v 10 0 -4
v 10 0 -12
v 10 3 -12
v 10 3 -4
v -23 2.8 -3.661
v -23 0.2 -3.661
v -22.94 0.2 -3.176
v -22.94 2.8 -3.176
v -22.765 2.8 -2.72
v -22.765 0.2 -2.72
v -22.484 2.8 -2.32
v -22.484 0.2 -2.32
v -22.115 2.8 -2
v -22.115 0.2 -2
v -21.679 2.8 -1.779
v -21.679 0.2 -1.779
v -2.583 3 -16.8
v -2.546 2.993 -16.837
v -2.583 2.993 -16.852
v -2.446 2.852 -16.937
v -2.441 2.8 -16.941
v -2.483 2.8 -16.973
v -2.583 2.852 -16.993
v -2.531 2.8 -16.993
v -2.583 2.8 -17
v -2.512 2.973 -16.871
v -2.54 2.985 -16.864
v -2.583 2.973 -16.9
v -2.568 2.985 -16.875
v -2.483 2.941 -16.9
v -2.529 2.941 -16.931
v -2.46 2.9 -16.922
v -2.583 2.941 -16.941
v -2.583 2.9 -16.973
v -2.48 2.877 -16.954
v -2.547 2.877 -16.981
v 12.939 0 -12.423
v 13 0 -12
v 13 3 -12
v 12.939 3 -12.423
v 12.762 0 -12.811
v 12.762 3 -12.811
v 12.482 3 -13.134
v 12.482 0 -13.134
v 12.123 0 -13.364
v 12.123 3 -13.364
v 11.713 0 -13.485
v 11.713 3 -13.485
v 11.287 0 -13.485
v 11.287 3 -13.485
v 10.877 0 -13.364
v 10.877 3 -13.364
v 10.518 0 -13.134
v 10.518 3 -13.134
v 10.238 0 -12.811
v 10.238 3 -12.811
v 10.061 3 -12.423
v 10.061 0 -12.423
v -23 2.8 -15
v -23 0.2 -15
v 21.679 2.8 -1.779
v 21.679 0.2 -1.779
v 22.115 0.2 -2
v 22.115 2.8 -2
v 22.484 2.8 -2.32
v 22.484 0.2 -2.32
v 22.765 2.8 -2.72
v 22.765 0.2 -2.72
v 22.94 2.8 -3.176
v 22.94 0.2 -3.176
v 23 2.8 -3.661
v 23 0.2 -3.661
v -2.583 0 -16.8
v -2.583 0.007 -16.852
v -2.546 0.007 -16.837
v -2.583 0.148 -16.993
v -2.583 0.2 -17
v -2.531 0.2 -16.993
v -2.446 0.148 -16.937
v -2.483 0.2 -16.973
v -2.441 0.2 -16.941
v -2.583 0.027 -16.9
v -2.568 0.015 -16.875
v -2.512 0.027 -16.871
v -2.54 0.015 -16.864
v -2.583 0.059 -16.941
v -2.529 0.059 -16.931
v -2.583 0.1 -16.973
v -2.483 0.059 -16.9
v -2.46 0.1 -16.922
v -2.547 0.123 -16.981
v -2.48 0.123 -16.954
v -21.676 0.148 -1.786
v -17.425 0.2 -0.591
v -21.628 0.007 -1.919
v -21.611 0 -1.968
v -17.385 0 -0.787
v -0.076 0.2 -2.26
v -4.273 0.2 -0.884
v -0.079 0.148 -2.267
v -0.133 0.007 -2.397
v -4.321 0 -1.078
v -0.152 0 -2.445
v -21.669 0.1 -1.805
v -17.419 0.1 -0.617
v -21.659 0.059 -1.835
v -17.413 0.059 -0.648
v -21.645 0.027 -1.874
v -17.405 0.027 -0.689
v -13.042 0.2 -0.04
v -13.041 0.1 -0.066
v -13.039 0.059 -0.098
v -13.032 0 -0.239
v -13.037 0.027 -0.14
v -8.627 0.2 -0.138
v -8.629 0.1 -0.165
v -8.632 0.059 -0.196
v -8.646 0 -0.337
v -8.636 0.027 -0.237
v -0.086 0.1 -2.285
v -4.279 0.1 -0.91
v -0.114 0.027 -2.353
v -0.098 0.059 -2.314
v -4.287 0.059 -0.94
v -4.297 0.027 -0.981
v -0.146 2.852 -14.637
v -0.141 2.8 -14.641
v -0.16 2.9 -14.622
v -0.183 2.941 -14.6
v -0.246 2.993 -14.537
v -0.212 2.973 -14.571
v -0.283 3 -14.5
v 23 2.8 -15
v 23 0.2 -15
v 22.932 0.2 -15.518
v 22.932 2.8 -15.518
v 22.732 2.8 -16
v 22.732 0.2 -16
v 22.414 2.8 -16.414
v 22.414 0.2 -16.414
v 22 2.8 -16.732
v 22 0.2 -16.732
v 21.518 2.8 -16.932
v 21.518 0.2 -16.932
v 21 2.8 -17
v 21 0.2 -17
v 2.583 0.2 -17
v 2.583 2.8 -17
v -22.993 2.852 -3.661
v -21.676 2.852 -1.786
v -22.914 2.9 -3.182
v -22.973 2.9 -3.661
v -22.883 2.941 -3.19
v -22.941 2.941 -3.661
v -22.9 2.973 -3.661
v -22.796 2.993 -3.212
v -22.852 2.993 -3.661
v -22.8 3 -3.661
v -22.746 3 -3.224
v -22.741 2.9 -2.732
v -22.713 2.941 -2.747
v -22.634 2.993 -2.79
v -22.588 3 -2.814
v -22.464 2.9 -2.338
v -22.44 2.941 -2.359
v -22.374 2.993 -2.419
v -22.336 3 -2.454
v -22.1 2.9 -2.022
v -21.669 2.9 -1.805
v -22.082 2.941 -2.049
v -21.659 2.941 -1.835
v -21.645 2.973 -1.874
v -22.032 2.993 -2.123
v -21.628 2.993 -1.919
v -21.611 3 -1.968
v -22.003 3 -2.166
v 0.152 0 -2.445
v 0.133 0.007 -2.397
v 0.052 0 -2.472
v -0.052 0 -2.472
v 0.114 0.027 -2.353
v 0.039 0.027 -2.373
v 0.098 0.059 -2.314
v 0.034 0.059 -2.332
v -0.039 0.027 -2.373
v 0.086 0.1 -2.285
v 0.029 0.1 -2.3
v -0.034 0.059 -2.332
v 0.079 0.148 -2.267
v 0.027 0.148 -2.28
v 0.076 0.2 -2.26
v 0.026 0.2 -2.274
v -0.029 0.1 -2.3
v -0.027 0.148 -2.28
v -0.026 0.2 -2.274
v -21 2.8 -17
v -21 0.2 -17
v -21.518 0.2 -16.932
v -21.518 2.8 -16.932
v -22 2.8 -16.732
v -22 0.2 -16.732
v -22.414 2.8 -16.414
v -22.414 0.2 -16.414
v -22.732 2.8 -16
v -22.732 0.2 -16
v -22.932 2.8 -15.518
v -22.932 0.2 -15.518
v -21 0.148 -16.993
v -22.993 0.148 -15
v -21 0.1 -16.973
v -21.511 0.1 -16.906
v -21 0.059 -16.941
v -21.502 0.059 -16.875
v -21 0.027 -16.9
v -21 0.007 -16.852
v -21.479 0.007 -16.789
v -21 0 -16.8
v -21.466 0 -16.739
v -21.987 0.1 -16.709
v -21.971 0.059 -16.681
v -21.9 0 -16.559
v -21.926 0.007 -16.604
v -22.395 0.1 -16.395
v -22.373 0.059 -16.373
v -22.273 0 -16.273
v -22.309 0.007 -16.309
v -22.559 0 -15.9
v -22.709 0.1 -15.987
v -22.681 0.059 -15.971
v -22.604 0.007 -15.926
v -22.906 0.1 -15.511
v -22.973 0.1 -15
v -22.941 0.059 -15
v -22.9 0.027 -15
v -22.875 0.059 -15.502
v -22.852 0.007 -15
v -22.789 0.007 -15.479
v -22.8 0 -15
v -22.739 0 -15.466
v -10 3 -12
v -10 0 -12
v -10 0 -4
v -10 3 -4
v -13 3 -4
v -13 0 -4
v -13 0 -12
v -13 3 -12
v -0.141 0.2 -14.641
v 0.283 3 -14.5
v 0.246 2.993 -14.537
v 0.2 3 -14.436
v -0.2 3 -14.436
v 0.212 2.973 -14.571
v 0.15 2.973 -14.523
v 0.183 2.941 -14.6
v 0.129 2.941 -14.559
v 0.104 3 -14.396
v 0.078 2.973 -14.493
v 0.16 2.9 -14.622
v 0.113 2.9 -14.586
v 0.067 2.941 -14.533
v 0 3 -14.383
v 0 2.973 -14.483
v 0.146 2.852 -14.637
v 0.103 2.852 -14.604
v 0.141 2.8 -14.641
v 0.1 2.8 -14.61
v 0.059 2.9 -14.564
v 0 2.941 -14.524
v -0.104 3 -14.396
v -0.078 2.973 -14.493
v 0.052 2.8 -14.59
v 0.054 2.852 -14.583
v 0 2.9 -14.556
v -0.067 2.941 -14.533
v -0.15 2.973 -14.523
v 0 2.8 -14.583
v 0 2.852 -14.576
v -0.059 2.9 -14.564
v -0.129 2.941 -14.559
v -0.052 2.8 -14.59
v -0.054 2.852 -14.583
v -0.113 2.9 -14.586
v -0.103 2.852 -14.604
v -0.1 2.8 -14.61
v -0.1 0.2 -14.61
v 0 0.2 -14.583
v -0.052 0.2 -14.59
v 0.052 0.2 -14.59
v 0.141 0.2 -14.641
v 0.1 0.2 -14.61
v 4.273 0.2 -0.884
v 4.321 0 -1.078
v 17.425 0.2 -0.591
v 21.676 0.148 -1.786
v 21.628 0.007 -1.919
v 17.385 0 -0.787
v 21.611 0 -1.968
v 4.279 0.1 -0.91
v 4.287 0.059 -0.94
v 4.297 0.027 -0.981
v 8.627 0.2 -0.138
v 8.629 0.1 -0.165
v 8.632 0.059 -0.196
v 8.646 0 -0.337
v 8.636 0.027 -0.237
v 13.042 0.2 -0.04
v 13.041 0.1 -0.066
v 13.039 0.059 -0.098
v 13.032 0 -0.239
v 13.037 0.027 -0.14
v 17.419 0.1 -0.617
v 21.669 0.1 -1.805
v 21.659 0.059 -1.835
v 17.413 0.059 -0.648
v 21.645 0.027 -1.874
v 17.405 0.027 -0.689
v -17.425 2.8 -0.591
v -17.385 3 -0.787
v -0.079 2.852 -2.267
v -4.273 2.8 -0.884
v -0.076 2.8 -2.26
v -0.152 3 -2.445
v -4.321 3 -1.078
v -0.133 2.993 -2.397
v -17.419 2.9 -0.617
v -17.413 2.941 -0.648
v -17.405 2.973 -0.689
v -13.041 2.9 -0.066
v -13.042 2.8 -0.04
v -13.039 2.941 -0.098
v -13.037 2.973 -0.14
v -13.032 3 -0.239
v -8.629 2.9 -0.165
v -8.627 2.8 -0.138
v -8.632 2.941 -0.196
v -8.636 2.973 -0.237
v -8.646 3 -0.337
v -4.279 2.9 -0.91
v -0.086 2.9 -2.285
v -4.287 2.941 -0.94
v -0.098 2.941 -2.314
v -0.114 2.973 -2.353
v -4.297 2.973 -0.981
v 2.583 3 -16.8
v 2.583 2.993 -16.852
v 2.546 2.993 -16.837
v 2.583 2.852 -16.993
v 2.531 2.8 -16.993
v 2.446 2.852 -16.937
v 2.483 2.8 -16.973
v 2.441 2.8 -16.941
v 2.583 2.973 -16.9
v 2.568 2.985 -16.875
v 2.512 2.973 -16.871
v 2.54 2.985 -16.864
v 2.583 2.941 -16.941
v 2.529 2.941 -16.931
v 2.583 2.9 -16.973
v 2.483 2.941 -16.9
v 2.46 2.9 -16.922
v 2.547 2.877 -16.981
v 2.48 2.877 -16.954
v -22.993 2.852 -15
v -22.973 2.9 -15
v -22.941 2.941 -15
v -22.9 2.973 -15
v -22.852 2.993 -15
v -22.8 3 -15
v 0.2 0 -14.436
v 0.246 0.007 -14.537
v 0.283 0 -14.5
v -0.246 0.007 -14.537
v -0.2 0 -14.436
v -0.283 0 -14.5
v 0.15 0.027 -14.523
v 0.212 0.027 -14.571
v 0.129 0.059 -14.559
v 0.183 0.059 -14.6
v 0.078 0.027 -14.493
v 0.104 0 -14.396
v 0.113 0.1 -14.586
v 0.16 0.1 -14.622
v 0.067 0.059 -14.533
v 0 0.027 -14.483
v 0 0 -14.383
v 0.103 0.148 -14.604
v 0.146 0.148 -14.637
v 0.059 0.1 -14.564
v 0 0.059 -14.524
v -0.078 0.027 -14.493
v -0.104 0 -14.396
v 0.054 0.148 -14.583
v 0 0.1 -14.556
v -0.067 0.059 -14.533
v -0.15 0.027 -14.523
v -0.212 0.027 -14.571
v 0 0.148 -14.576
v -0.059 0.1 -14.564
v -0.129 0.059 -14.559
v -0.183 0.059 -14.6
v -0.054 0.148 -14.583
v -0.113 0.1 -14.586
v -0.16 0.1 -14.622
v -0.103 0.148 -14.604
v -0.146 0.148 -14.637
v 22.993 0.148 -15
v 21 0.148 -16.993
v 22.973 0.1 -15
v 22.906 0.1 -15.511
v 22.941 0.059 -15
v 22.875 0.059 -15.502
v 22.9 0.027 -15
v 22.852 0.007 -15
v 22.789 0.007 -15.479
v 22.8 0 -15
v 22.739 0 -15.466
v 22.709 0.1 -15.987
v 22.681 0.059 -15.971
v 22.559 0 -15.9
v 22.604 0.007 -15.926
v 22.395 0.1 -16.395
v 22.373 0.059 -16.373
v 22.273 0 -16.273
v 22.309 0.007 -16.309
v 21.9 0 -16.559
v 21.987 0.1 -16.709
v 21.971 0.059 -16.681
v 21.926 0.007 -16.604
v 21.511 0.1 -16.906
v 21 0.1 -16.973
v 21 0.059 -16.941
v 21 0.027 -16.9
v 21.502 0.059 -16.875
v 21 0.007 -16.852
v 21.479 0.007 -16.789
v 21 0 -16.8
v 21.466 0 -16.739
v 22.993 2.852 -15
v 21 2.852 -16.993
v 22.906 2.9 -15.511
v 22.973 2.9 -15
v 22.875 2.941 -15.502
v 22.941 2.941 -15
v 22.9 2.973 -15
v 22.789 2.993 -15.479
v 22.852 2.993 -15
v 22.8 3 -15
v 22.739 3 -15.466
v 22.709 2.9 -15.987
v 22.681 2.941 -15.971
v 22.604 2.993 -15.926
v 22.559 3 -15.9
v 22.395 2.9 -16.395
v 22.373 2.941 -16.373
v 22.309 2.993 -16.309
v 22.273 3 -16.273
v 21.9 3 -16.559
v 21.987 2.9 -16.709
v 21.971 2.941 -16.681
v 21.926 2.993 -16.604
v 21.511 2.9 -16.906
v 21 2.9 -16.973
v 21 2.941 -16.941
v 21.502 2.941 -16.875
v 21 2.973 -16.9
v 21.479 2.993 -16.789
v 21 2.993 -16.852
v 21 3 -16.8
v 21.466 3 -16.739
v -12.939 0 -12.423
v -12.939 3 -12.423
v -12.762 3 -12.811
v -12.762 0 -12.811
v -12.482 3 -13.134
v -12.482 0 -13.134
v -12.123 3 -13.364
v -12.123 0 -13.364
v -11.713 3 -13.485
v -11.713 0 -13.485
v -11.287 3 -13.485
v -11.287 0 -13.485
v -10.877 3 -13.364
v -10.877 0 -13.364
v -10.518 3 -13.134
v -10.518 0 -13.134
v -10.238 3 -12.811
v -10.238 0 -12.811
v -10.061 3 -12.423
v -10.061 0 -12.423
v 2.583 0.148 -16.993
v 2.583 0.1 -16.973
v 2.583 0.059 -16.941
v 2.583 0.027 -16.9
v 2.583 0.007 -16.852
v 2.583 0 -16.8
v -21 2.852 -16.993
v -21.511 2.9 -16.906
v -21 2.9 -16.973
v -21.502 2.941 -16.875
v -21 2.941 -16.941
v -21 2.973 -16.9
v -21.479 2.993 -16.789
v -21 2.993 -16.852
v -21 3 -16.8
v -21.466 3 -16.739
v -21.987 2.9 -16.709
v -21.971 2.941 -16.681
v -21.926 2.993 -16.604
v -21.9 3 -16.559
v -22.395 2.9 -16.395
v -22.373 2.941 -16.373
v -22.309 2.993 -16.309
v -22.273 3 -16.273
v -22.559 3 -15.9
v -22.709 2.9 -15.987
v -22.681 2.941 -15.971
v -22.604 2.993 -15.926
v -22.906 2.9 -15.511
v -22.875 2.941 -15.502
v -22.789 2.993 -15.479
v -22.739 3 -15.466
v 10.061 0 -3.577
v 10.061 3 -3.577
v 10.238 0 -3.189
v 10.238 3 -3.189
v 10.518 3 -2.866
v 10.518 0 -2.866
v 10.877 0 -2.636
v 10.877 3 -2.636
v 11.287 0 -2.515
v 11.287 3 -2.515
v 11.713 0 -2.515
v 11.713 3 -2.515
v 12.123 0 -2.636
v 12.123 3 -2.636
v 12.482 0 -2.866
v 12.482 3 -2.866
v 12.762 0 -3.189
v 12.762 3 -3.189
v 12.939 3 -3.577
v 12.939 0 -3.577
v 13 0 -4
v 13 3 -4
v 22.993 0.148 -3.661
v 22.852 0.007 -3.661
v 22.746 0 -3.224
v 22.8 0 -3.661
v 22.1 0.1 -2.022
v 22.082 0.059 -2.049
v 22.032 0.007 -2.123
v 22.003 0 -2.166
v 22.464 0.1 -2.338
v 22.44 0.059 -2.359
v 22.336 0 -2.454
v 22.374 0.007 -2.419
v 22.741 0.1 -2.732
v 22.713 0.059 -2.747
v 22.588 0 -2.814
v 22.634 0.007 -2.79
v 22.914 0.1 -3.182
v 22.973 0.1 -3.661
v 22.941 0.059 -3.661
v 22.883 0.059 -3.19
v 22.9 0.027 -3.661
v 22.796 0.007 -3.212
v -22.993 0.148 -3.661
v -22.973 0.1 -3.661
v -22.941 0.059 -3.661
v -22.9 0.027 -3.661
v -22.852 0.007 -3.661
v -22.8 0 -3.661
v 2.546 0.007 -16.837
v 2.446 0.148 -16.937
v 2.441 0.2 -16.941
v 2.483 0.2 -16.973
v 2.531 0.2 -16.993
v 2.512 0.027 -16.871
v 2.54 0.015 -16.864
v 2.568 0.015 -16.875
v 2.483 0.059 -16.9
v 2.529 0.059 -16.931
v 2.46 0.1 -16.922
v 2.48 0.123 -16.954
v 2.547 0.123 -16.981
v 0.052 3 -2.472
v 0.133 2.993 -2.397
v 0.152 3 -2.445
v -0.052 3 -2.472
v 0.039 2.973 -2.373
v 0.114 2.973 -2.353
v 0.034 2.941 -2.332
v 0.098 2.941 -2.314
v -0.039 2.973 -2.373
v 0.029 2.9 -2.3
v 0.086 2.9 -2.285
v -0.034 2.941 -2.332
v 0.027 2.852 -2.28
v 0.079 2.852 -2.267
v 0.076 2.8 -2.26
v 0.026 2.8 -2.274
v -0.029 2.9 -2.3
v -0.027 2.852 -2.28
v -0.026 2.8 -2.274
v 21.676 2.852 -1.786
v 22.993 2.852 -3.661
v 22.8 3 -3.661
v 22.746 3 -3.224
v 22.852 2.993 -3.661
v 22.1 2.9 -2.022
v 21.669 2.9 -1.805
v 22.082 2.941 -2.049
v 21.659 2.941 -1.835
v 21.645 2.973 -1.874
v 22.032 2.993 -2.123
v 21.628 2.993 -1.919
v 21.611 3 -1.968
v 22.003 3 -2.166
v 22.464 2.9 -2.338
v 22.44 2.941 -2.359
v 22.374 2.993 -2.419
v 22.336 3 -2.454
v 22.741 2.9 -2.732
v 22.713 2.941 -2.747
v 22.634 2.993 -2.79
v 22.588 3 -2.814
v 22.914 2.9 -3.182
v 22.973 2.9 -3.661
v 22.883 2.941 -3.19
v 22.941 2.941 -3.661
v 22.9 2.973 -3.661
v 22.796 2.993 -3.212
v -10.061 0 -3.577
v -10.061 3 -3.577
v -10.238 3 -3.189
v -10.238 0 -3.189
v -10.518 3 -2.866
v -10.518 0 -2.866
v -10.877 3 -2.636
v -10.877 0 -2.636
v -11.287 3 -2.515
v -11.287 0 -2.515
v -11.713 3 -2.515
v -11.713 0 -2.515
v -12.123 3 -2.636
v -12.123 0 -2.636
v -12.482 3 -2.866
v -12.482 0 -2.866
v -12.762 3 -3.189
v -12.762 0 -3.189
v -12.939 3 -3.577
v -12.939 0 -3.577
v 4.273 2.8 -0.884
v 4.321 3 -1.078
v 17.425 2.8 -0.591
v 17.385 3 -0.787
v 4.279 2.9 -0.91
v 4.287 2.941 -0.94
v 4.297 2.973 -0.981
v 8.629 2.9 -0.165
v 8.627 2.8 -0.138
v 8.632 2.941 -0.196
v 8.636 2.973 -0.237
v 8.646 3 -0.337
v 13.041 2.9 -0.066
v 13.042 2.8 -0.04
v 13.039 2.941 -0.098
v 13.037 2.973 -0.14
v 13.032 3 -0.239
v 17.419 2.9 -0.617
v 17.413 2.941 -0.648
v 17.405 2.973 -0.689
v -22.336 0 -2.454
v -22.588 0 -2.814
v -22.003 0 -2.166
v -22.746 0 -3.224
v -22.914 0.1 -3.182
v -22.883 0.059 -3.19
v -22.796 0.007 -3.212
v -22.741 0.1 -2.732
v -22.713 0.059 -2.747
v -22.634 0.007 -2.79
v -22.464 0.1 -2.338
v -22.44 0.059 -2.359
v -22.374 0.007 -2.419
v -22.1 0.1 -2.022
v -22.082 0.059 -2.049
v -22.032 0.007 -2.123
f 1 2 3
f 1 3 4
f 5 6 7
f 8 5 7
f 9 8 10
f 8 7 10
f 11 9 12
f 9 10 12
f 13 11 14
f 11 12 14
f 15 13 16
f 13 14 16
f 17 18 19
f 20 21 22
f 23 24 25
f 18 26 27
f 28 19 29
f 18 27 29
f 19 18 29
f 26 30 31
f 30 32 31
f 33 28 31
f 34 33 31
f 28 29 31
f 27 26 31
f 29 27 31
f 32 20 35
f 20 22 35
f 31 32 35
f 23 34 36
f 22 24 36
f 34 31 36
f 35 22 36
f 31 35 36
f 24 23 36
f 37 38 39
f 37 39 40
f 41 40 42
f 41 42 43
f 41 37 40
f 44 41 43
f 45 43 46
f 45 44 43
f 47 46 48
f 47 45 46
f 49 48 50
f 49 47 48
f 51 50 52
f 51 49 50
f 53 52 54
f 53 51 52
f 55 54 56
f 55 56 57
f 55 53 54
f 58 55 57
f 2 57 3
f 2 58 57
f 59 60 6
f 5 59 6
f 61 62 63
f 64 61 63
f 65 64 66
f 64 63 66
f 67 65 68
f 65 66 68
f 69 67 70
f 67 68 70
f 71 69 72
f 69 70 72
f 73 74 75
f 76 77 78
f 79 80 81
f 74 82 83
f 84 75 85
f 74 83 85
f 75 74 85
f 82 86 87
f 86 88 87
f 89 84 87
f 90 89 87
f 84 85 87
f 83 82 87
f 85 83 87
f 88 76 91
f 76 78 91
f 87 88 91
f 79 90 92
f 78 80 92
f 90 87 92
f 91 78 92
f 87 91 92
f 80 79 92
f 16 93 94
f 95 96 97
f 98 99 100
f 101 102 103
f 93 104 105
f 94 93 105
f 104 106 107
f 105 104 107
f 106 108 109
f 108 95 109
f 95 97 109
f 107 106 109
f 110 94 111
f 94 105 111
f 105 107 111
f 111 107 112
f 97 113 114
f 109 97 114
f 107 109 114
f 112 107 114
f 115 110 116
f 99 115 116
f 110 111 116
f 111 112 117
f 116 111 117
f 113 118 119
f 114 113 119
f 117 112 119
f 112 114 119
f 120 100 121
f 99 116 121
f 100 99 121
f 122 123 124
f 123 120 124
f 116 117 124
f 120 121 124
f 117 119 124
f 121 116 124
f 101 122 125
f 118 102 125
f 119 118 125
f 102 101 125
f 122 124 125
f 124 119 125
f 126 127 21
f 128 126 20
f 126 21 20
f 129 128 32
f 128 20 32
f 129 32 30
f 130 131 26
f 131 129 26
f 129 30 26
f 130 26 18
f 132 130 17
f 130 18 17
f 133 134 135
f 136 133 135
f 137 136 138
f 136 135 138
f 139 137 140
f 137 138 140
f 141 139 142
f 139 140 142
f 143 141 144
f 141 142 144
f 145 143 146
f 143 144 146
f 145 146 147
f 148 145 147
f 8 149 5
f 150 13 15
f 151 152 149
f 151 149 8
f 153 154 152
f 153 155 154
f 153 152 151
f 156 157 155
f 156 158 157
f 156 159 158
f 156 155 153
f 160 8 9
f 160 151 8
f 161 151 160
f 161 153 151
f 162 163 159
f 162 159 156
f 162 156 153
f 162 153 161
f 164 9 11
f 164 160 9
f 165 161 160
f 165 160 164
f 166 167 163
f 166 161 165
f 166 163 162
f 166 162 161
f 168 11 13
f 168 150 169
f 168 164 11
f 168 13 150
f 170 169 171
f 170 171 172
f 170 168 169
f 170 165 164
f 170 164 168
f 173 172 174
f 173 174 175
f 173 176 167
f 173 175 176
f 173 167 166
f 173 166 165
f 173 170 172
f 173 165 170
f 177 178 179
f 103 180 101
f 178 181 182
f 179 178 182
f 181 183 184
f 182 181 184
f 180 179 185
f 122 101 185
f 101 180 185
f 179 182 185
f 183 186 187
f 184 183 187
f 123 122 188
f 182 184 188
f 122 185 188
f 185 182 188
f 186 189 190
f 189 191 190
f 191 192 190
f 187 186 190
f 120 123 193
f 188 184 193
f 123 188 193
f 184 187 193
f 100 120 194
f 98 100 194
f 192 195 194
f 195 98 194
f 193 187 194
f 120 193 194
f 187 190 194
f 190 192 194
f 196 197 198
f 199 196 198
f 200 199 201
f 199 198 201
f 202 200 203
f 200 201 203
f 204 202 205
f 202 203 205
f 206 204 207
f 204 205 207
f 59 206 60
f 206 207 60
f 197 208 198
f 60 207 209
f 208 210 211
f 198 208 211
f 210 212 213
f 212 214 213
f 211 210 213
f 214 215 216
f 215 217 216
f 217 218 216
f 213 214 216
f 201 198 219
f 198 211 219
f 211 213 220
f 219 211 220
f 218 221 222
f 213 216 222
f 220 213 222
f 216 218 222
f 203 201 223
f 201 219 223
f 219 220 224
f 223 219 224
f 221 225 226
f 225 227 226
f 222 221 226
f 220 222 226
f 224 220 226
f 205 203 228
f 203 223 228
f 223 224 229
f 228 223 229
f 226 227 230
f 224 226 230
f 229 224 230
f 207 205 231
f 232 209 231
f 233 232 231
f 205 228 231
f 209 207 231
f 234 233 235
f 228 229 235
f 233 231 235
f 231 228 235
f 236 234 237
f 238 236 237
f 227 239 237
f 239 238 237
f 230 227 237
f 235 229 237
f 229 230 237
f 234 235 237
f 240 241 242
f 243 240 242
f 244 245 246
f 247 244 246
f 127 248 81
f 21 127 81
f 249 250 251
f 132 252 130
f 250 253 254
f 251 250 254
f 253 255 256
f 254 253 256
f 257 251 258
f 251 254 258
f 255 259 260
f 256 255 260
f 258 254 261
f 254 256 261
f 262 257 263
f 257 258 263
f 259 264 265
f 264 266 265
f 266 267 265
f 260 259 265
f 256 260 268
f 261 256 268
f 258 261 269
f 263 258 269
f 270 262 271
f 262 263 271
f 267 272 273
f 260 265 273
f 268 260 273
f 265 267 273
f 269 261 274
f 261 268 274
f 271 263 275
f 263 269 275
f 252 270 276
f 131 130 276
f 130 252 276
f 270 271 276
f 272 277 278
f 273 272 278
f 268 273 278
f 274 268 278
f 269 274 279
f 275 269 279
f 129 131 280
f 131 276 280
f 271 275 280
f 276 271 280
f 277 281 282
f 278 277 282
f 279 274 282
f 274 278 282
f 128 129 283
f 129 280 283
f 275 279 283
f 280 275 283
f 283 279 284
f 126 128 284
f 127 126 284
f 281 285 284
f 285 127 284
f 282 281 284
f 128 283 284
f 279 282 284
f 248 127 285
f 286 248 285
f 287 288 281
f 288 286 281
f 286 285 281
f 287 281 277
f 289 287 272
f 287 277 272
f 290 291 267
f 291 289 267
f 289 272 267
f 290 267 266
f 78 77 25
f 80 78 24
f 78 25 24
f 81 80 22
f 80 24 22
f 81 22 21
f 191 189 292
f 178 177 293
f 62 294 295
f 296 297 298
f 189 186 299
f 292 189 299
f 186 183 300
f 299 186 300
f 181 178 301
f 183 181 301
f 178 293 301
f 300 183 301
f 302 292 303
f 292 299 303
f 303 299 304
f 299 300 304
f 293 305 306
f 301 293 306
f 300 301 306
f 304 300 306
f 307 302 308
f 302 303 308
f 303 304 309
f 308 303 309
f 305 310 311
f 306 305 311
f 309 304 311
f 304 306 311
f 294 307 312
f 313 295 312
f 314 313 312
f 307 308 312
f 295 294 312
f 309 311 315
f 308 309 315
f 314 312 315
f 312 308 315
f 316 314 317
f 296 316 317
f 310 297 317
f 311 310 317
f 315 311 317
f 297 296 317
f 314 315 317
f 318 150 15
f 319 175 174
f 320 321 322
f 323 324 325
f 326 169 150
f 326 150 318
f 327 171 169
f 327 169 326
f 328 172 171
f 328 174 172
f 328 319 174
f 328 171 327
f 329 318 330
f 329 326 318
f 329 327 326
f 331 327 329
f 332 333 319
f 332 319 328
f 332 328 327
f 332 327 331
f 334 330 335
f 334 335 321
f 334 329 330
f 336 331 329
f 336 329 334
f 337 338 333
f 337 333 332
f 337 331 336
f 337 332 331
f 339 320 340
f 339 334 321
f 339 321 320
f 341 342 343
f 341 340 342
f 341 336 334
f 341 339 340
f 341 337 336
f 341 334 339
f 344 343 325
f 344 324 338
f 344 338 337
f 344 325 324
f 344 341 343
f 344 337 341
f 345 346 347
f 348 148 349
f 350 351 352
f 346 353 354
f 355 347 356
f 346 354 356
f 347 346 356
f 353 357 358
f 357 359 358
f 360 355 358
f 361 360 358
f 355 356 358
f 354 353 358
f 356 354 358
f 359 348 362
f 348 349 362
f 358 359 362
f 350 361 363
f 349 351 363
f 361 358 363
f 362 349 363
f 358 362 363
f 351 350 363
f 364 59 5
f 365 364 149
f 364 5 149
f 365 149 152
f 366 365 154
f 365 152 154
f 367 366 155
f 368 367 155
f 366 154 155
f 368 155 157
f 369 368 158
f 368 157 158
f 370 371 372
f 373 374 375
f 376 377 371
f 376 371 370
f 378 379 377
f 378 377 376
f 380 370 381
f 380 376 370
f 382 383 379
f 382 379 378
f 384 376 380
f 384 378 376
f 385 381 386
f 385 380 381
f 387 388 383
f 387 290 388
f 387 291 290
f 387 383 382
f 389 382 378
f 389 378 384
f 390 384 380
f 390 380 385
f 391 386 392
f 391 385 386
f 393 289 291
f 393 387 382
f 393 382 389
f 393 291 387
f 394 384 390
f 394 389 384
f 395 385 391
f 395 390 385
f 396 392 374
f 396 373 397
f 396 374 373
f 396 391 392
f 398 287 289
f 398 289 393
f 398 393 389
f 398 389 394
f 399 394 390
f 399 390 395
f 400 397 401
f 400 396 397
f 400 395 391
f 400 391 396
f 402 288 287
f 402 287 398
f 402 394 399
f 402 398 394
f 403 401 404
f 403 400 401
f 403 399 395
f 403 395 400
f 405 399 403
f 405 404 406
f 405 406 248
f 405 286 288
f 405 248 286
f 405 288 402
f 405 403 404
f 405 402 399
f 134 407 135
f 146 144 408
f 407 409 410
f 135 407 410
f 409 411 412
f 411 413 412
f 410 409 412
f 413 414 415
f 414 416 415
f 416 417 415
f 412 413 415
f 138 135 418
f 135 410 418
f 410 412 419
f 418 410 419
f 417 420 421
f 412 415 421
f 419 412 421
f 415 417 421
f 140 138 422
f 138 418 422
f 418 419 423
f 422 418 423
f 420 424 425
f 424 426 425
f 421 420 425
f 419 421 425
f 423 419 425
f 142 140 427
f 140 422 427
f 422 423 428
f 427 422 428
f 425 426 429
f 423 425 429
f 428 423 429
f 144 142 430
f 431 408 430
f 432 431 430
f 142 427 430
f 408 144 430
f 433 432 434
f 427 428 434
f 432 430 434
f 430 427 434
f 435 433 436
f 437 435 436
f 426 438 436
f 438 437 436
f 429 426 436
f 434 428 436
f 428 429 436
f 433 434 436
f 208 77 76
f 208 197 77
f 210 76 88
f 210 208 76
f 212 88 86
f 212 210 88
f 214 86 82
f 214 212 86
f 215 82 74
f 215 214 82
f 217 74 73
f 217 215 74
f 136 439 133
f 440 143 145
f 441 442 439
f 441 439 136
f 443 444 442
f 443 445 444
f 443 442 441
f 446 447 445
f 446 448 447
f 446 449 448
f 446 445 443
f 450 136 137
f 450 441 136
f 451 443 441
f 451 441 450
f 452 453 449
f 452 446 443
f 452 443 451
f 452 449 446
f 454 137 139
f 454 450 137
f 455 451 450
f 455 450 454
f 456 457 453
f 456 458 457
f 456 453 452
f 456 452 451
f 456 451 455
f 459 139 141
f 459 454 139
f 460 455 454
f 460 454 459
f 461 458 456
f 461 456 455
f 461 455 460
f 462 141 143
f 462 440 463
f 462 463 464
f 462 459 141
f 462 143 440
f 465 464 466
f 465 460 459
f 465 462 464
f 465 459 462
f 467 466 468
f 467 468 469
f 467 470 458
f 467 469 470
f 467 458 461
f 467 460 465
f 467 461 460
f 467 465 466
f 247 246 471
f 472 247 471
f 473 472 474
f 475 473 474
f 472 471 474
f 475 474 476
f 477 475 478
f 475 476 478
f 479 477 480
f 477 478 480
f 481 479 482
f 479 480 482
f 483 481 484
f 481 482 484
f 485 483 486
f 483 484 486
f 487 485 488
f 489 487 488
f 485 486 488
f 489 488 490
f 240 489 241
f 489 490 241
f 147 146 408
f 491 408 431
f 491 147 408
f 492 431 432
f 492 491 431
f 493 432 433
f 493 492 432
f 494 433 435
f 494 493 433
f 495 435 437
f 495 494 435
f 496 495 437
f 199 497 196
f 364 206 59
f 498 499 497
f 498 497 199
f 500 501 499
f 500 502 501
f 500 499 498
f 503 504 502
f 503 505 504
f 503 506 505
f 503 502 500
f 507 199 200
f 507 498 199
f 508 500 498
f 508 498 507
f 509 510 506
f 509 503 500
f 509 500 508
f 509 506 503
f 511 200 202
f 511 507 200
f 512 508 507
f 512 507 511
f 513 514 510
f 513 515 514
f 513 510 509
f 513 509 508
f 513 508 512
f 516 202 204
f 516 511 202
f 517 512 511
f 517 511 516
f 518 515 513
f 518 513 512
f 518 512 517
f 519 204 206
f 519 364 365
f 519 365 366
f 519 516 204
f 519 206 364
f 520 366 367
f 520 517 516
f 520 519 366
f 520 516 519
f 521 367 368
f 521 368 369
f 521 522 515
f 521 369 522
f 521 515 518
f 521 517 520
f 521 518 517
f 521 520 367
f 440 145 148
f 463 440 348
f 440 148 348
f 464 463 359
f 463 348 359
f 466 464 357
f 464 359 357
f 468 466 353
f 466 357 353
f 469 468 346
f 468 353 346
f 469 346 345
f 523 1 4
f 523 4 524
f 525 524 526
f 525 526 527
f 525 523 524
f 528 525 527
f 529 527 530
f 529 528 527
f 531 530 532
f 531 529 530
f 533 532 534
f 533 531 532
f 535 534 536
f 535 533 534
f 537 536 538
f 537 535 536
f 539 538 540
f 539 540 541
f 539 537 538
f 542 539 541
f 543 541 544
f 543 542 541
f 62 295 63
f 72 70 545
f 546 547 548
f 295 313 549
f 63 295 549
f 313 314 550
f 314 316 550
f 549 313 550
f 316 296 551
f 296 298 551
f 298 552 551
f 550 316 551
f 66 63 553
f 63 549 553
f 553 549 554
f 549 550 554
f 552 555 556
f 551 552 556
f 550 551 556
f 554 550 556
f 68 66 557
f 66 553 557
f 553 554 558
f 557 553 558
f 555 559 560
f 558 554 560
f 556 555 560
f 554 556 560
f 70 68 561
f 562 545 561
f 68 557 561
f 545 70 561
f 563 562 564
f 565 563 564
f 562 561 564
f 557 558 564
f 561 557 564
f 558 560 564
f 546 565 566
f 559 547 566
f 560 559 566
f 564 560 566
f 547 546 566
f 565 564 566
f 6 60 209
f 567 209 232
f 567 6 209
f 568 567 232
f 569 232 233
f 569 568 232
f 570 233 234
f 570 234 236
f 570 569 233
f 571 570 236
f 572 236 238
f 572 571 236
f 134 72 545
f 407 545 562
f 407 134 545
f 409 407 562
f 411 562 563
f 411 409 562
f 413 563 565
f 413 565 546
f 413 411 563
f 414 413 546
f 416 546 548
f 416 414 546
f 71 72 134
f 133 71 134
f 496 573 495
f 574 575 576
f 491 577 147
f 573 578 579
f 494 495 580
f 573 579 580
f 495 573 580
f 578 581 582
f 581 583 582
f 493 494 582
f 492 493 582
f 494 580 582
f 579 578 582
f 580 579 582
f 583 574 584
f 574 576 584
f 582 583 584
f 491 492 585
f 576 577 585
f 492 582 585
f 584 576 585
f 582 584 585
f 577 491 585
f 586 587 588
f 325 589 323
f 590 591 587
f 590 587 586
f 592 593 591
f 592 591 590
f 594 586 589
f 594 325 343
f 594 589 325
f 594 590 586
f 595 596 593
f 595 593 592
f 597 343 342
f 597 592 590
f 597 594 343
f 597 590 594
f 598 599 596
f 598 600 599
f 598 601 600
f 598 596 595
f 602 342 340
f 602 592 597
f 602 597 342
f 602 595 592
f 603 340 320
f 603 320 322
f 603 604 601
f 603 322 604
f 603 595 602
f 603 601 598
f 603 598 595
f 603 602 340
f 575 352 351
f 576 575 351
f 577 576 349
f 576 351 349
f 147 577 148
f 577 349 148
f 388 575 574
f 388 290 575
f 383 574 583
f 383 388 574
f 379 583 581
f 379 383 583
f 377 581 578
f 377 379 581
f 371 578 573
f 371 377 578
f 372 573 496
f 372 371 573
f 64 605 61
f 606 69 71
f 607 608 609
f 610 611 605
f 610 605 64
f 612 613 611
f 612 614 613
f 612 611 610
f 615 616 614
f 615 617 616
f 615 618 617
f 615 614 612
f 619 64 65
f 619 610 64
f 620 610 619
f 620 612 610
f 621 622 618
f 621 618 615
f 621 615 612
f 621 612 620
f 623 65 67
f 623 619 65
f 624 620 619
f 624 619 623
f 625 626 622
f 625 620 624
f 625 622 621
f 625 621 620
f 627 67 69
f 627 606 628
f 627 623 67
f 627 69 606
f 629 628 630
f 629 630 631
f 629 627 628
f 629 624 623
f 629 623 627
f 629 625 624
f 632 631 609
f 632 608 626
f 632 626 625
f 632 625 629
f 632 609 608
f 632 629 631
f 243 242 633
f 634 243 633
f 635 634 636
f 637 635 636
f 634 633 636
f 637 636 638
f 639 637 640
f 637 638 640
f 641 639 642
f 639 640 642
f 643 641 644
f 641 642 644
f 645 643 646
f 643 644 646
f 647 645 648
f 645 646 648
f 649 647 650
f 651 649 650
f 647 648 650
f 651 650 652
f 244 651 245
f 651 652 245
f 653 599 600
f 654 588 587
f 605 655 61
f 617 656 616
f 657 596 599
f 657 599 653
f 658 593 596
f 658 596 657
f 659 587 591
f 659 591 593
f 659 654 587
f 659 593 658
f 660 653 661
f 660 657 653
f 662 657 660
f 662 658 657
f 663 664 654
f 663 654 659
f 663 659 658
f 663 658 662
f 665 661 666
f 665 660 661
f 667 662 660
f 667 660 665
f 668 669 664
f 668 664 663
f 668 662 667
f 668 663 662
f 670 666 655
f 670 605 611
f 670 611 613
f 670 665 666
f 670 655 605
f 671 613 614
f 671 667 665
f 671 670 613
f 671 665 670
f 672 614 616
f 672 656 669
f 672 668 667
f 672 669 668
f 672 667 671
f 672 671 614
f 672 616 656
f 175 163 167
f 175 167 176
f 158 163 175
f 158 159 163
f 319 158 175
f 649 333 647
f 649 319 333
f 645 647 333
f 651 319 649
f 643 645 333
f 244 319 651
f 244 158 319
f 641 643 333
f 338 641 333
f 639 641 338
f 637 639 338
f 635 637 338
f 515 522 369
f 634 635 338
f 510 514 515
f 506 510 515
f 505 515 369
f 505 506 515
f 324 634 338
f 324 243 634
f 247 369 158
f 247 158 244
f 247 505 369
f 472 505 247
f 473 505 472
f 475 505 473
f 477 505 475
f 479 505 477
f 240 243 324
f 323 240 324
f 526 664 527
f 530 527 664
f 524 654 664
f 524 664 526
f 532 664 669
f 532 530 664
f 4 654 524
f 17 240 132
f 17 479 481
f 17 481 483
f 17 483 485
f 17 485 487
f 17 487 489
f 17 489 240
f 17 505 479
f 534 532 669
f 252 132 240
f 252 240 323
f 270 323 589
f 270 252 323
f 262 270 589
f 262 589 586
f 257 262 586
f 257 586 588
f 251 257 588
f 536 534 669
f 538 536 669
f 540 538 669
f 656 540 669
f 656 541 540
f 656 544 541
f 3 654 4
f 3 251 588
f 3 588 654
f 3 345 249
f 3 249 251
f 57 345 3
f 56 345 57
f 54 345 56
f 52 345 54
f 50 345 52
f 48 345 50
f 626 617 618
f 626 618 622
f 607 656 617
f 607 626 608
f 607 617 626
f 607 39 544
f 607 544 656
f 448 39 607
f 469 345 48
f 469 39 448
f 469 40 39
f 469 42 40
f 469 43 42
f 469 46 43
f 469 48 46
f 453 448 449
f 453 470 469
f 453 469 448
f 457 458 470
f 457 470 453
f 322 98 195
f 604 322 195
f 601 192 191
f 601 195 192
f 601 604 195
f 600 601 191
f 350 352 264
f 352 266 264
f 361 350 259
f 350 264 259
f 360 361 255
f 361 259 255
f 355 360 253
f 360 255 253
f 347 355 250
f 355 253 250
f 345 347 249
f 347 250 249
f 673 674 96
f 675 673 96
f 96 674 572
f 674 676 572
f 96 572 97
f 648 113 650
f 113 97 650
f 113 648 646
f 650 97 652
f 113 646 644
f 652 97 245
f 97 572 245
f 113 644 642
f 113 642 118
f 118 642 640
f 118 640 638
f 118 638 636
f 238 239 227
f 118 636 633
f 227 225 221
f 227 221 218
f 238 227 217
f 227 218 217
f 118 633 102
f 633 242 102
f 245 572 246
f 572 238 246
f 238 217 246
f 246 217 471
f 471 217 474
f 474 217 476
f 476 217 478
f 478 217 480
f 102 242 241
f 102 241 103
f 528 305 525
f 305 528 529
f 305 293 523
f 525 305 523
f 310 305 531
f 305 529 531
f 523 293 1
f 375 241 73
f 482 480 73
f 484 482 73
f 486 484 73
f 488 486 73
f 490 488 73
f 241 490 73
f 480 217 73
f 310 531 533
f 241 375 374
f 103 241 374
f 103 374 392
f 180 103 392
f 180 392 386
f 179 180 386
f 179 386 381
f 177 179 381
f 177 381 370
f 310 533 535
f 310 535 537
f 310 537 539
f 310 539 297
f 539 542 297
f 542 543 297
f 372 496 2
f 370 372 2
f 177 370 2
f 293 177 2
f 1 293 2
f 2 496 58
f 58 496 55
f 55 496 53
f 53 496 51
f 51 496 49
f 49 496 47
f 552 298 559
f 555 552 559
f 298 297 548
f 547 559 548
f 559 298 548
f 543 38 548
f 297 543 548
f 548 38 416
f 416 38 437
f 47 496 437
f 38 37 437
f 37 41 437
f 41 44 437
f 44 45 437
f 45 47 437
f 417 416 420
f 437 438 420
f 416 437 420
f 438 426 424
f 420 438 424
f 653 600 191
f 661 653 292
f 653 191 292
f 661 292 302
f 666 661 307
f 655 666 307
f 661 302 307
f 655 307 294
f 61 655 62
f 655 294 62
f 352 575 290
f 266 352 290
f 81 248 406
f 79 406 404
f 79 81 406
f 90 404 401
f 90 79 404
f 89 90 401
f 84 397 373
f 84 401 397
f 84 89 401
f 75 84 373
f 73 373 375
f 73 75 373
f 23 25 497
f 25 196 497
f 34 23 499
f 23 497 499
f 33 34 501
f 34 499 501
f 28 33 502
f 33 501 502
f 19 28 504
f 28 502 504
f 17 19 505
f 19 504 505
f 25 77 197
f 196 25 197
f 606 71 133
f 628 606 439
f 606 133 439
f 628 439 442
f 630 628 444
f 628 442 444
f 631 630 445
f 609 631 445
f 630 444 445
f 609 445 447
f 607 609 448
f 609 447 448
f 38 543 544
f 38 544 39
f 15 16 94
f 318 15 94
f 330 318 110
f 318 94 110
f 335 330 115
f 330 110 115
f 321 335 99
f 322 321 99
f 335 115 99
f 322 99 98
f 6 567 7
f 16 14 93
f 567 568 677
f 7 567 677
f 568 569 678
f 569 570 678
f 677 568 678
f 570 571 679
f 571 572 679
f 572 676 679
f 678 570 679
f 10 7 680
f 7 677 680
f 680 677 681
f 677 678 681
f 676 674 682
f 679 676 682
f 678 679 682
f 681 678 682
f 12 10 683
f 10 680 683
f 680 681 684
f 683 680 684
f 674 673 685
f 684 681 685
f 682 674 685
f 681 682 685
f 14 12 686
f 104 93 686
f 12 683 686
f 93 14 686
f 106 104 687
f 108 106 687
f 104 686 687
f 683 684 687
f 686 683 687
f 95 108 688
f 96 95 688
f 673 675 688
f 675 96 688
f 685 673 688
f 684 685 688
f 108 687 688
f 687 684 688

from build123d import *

# Parameters (mm, degrees)
BOSS_EXTRUDE1_DEPTH = 3
FILLET1_R           = 0.2


with BuildPart() as part:
    # Sketch1 → Boss-Extrude1 (new body)
    with BuildSketch(Plane(origin=(0, 0, 0), x_dir=(1, 0, 0), z_dir=(0, 1, 0))):
        with BuildLine():
            Line((-2.5, 17), (-21, 17))
            ThreePointArc((-21, 17), (-22.414213562, 16.414213562), (-23, 15))
            Line((-23, 15), (-23, 3.660865618))
            ThreePointArc((-23, 3.660865618), (-22.636634177, 2.511331551), (-21.678571429, 1.779498876))
            ThreePointArc((-21.678571429, 1.779498876), (-10.791388434, 0.008370007), (0, 2.291697995))
            ThreePointArc((0, 2.291697995), (10.791388434, 0.008370007), (21.678571429, 1.779498876))
            ThreePointArc((21.678571429, 1.779498876), (22.636634177, 2.511331551), (23, 3.660865618))
            Line((23, 3.660865618), (23, 15))
            ThreePointArc((23, 15), (22.414213562, 16.414213562), (21, 17))
            Line((21, 17), (2.5, 17))
            Line((2.5, 17), (0, 14.5))
            Line((0, 14.5), (-2.5, 17))
        make_face()
        with BuildLine():
            Line((-10, 12), (-10, 4))
            ThreePointArc((-10, 4), (-11.5, 2.5), (-13, 4))
            Line((-13, 4), (-13, 12))
            ThreePointArc((-13, 12), (-11.5, 13.5), (-10, 12))
        make_face(mode=Mode.SUBTRACT)
        with BuildLine():
            Line((10, 12), (10, 4))
            ThreePointArc((10, 4), (11.5, 2.5), (13, 4))
            Line((13, 4), (13, 12))
            ThreePointArc((13, 12), (11.5, 13.5), (10, 12))
        make_face(mode=Mode.SUBTRACT)
    extrude(amount=BOSS_EXTRUDE1_DEPTH)

    # Fillet1
    fillet1_edges = [part.edges().sort_by_distance(p)[0] for p in [
        (-22.414213562, 3, -16.414213562),
        (1.25, 0, -15.75),
        (11.75, 0, -17),
        (22.414213562, 0, -16.414213562),
        (23, 0, -9.330432809),
        (22.636634177, 0, -2.511331551),
        (10.791388434, 0, -0.008370007),
        (-23, 3, -9.330432809),
        (-10.791388434, 0, -0.008370007),
        (-22.636634177, 0, -2.511331551),
        (-23, 0, -9.330432809),
        (-22.414213562, 0, -16.414213562),
        (-11.75, 0, -17),
        (-1.25, 0, -15.75),
        (-22.636634177, 3, -2.511331551),
        (-10.791388434, 3, -0.008370007),
        (0, 1.5, -14.5),
        (2.5, 1.5, -17),
        (0, 1.5, -2.291697995),
        (-2.5, 1.5, -17),
        (10.791388434, 3, -0.008370007),
        (22.636634177, 3, -2.511331551),
        (23, 3, -9.330432809),
        (22.414213562, 3, -16.414213562),
        (11.75, 3, -17),
        (1.25, 3, -15.75),
        (-1.25, 3, -15.75),
        (-11.75, 3, -17),
    ]]
    fillet(fillet1_edges, radius=FILLET1_R)


solid = part.part
